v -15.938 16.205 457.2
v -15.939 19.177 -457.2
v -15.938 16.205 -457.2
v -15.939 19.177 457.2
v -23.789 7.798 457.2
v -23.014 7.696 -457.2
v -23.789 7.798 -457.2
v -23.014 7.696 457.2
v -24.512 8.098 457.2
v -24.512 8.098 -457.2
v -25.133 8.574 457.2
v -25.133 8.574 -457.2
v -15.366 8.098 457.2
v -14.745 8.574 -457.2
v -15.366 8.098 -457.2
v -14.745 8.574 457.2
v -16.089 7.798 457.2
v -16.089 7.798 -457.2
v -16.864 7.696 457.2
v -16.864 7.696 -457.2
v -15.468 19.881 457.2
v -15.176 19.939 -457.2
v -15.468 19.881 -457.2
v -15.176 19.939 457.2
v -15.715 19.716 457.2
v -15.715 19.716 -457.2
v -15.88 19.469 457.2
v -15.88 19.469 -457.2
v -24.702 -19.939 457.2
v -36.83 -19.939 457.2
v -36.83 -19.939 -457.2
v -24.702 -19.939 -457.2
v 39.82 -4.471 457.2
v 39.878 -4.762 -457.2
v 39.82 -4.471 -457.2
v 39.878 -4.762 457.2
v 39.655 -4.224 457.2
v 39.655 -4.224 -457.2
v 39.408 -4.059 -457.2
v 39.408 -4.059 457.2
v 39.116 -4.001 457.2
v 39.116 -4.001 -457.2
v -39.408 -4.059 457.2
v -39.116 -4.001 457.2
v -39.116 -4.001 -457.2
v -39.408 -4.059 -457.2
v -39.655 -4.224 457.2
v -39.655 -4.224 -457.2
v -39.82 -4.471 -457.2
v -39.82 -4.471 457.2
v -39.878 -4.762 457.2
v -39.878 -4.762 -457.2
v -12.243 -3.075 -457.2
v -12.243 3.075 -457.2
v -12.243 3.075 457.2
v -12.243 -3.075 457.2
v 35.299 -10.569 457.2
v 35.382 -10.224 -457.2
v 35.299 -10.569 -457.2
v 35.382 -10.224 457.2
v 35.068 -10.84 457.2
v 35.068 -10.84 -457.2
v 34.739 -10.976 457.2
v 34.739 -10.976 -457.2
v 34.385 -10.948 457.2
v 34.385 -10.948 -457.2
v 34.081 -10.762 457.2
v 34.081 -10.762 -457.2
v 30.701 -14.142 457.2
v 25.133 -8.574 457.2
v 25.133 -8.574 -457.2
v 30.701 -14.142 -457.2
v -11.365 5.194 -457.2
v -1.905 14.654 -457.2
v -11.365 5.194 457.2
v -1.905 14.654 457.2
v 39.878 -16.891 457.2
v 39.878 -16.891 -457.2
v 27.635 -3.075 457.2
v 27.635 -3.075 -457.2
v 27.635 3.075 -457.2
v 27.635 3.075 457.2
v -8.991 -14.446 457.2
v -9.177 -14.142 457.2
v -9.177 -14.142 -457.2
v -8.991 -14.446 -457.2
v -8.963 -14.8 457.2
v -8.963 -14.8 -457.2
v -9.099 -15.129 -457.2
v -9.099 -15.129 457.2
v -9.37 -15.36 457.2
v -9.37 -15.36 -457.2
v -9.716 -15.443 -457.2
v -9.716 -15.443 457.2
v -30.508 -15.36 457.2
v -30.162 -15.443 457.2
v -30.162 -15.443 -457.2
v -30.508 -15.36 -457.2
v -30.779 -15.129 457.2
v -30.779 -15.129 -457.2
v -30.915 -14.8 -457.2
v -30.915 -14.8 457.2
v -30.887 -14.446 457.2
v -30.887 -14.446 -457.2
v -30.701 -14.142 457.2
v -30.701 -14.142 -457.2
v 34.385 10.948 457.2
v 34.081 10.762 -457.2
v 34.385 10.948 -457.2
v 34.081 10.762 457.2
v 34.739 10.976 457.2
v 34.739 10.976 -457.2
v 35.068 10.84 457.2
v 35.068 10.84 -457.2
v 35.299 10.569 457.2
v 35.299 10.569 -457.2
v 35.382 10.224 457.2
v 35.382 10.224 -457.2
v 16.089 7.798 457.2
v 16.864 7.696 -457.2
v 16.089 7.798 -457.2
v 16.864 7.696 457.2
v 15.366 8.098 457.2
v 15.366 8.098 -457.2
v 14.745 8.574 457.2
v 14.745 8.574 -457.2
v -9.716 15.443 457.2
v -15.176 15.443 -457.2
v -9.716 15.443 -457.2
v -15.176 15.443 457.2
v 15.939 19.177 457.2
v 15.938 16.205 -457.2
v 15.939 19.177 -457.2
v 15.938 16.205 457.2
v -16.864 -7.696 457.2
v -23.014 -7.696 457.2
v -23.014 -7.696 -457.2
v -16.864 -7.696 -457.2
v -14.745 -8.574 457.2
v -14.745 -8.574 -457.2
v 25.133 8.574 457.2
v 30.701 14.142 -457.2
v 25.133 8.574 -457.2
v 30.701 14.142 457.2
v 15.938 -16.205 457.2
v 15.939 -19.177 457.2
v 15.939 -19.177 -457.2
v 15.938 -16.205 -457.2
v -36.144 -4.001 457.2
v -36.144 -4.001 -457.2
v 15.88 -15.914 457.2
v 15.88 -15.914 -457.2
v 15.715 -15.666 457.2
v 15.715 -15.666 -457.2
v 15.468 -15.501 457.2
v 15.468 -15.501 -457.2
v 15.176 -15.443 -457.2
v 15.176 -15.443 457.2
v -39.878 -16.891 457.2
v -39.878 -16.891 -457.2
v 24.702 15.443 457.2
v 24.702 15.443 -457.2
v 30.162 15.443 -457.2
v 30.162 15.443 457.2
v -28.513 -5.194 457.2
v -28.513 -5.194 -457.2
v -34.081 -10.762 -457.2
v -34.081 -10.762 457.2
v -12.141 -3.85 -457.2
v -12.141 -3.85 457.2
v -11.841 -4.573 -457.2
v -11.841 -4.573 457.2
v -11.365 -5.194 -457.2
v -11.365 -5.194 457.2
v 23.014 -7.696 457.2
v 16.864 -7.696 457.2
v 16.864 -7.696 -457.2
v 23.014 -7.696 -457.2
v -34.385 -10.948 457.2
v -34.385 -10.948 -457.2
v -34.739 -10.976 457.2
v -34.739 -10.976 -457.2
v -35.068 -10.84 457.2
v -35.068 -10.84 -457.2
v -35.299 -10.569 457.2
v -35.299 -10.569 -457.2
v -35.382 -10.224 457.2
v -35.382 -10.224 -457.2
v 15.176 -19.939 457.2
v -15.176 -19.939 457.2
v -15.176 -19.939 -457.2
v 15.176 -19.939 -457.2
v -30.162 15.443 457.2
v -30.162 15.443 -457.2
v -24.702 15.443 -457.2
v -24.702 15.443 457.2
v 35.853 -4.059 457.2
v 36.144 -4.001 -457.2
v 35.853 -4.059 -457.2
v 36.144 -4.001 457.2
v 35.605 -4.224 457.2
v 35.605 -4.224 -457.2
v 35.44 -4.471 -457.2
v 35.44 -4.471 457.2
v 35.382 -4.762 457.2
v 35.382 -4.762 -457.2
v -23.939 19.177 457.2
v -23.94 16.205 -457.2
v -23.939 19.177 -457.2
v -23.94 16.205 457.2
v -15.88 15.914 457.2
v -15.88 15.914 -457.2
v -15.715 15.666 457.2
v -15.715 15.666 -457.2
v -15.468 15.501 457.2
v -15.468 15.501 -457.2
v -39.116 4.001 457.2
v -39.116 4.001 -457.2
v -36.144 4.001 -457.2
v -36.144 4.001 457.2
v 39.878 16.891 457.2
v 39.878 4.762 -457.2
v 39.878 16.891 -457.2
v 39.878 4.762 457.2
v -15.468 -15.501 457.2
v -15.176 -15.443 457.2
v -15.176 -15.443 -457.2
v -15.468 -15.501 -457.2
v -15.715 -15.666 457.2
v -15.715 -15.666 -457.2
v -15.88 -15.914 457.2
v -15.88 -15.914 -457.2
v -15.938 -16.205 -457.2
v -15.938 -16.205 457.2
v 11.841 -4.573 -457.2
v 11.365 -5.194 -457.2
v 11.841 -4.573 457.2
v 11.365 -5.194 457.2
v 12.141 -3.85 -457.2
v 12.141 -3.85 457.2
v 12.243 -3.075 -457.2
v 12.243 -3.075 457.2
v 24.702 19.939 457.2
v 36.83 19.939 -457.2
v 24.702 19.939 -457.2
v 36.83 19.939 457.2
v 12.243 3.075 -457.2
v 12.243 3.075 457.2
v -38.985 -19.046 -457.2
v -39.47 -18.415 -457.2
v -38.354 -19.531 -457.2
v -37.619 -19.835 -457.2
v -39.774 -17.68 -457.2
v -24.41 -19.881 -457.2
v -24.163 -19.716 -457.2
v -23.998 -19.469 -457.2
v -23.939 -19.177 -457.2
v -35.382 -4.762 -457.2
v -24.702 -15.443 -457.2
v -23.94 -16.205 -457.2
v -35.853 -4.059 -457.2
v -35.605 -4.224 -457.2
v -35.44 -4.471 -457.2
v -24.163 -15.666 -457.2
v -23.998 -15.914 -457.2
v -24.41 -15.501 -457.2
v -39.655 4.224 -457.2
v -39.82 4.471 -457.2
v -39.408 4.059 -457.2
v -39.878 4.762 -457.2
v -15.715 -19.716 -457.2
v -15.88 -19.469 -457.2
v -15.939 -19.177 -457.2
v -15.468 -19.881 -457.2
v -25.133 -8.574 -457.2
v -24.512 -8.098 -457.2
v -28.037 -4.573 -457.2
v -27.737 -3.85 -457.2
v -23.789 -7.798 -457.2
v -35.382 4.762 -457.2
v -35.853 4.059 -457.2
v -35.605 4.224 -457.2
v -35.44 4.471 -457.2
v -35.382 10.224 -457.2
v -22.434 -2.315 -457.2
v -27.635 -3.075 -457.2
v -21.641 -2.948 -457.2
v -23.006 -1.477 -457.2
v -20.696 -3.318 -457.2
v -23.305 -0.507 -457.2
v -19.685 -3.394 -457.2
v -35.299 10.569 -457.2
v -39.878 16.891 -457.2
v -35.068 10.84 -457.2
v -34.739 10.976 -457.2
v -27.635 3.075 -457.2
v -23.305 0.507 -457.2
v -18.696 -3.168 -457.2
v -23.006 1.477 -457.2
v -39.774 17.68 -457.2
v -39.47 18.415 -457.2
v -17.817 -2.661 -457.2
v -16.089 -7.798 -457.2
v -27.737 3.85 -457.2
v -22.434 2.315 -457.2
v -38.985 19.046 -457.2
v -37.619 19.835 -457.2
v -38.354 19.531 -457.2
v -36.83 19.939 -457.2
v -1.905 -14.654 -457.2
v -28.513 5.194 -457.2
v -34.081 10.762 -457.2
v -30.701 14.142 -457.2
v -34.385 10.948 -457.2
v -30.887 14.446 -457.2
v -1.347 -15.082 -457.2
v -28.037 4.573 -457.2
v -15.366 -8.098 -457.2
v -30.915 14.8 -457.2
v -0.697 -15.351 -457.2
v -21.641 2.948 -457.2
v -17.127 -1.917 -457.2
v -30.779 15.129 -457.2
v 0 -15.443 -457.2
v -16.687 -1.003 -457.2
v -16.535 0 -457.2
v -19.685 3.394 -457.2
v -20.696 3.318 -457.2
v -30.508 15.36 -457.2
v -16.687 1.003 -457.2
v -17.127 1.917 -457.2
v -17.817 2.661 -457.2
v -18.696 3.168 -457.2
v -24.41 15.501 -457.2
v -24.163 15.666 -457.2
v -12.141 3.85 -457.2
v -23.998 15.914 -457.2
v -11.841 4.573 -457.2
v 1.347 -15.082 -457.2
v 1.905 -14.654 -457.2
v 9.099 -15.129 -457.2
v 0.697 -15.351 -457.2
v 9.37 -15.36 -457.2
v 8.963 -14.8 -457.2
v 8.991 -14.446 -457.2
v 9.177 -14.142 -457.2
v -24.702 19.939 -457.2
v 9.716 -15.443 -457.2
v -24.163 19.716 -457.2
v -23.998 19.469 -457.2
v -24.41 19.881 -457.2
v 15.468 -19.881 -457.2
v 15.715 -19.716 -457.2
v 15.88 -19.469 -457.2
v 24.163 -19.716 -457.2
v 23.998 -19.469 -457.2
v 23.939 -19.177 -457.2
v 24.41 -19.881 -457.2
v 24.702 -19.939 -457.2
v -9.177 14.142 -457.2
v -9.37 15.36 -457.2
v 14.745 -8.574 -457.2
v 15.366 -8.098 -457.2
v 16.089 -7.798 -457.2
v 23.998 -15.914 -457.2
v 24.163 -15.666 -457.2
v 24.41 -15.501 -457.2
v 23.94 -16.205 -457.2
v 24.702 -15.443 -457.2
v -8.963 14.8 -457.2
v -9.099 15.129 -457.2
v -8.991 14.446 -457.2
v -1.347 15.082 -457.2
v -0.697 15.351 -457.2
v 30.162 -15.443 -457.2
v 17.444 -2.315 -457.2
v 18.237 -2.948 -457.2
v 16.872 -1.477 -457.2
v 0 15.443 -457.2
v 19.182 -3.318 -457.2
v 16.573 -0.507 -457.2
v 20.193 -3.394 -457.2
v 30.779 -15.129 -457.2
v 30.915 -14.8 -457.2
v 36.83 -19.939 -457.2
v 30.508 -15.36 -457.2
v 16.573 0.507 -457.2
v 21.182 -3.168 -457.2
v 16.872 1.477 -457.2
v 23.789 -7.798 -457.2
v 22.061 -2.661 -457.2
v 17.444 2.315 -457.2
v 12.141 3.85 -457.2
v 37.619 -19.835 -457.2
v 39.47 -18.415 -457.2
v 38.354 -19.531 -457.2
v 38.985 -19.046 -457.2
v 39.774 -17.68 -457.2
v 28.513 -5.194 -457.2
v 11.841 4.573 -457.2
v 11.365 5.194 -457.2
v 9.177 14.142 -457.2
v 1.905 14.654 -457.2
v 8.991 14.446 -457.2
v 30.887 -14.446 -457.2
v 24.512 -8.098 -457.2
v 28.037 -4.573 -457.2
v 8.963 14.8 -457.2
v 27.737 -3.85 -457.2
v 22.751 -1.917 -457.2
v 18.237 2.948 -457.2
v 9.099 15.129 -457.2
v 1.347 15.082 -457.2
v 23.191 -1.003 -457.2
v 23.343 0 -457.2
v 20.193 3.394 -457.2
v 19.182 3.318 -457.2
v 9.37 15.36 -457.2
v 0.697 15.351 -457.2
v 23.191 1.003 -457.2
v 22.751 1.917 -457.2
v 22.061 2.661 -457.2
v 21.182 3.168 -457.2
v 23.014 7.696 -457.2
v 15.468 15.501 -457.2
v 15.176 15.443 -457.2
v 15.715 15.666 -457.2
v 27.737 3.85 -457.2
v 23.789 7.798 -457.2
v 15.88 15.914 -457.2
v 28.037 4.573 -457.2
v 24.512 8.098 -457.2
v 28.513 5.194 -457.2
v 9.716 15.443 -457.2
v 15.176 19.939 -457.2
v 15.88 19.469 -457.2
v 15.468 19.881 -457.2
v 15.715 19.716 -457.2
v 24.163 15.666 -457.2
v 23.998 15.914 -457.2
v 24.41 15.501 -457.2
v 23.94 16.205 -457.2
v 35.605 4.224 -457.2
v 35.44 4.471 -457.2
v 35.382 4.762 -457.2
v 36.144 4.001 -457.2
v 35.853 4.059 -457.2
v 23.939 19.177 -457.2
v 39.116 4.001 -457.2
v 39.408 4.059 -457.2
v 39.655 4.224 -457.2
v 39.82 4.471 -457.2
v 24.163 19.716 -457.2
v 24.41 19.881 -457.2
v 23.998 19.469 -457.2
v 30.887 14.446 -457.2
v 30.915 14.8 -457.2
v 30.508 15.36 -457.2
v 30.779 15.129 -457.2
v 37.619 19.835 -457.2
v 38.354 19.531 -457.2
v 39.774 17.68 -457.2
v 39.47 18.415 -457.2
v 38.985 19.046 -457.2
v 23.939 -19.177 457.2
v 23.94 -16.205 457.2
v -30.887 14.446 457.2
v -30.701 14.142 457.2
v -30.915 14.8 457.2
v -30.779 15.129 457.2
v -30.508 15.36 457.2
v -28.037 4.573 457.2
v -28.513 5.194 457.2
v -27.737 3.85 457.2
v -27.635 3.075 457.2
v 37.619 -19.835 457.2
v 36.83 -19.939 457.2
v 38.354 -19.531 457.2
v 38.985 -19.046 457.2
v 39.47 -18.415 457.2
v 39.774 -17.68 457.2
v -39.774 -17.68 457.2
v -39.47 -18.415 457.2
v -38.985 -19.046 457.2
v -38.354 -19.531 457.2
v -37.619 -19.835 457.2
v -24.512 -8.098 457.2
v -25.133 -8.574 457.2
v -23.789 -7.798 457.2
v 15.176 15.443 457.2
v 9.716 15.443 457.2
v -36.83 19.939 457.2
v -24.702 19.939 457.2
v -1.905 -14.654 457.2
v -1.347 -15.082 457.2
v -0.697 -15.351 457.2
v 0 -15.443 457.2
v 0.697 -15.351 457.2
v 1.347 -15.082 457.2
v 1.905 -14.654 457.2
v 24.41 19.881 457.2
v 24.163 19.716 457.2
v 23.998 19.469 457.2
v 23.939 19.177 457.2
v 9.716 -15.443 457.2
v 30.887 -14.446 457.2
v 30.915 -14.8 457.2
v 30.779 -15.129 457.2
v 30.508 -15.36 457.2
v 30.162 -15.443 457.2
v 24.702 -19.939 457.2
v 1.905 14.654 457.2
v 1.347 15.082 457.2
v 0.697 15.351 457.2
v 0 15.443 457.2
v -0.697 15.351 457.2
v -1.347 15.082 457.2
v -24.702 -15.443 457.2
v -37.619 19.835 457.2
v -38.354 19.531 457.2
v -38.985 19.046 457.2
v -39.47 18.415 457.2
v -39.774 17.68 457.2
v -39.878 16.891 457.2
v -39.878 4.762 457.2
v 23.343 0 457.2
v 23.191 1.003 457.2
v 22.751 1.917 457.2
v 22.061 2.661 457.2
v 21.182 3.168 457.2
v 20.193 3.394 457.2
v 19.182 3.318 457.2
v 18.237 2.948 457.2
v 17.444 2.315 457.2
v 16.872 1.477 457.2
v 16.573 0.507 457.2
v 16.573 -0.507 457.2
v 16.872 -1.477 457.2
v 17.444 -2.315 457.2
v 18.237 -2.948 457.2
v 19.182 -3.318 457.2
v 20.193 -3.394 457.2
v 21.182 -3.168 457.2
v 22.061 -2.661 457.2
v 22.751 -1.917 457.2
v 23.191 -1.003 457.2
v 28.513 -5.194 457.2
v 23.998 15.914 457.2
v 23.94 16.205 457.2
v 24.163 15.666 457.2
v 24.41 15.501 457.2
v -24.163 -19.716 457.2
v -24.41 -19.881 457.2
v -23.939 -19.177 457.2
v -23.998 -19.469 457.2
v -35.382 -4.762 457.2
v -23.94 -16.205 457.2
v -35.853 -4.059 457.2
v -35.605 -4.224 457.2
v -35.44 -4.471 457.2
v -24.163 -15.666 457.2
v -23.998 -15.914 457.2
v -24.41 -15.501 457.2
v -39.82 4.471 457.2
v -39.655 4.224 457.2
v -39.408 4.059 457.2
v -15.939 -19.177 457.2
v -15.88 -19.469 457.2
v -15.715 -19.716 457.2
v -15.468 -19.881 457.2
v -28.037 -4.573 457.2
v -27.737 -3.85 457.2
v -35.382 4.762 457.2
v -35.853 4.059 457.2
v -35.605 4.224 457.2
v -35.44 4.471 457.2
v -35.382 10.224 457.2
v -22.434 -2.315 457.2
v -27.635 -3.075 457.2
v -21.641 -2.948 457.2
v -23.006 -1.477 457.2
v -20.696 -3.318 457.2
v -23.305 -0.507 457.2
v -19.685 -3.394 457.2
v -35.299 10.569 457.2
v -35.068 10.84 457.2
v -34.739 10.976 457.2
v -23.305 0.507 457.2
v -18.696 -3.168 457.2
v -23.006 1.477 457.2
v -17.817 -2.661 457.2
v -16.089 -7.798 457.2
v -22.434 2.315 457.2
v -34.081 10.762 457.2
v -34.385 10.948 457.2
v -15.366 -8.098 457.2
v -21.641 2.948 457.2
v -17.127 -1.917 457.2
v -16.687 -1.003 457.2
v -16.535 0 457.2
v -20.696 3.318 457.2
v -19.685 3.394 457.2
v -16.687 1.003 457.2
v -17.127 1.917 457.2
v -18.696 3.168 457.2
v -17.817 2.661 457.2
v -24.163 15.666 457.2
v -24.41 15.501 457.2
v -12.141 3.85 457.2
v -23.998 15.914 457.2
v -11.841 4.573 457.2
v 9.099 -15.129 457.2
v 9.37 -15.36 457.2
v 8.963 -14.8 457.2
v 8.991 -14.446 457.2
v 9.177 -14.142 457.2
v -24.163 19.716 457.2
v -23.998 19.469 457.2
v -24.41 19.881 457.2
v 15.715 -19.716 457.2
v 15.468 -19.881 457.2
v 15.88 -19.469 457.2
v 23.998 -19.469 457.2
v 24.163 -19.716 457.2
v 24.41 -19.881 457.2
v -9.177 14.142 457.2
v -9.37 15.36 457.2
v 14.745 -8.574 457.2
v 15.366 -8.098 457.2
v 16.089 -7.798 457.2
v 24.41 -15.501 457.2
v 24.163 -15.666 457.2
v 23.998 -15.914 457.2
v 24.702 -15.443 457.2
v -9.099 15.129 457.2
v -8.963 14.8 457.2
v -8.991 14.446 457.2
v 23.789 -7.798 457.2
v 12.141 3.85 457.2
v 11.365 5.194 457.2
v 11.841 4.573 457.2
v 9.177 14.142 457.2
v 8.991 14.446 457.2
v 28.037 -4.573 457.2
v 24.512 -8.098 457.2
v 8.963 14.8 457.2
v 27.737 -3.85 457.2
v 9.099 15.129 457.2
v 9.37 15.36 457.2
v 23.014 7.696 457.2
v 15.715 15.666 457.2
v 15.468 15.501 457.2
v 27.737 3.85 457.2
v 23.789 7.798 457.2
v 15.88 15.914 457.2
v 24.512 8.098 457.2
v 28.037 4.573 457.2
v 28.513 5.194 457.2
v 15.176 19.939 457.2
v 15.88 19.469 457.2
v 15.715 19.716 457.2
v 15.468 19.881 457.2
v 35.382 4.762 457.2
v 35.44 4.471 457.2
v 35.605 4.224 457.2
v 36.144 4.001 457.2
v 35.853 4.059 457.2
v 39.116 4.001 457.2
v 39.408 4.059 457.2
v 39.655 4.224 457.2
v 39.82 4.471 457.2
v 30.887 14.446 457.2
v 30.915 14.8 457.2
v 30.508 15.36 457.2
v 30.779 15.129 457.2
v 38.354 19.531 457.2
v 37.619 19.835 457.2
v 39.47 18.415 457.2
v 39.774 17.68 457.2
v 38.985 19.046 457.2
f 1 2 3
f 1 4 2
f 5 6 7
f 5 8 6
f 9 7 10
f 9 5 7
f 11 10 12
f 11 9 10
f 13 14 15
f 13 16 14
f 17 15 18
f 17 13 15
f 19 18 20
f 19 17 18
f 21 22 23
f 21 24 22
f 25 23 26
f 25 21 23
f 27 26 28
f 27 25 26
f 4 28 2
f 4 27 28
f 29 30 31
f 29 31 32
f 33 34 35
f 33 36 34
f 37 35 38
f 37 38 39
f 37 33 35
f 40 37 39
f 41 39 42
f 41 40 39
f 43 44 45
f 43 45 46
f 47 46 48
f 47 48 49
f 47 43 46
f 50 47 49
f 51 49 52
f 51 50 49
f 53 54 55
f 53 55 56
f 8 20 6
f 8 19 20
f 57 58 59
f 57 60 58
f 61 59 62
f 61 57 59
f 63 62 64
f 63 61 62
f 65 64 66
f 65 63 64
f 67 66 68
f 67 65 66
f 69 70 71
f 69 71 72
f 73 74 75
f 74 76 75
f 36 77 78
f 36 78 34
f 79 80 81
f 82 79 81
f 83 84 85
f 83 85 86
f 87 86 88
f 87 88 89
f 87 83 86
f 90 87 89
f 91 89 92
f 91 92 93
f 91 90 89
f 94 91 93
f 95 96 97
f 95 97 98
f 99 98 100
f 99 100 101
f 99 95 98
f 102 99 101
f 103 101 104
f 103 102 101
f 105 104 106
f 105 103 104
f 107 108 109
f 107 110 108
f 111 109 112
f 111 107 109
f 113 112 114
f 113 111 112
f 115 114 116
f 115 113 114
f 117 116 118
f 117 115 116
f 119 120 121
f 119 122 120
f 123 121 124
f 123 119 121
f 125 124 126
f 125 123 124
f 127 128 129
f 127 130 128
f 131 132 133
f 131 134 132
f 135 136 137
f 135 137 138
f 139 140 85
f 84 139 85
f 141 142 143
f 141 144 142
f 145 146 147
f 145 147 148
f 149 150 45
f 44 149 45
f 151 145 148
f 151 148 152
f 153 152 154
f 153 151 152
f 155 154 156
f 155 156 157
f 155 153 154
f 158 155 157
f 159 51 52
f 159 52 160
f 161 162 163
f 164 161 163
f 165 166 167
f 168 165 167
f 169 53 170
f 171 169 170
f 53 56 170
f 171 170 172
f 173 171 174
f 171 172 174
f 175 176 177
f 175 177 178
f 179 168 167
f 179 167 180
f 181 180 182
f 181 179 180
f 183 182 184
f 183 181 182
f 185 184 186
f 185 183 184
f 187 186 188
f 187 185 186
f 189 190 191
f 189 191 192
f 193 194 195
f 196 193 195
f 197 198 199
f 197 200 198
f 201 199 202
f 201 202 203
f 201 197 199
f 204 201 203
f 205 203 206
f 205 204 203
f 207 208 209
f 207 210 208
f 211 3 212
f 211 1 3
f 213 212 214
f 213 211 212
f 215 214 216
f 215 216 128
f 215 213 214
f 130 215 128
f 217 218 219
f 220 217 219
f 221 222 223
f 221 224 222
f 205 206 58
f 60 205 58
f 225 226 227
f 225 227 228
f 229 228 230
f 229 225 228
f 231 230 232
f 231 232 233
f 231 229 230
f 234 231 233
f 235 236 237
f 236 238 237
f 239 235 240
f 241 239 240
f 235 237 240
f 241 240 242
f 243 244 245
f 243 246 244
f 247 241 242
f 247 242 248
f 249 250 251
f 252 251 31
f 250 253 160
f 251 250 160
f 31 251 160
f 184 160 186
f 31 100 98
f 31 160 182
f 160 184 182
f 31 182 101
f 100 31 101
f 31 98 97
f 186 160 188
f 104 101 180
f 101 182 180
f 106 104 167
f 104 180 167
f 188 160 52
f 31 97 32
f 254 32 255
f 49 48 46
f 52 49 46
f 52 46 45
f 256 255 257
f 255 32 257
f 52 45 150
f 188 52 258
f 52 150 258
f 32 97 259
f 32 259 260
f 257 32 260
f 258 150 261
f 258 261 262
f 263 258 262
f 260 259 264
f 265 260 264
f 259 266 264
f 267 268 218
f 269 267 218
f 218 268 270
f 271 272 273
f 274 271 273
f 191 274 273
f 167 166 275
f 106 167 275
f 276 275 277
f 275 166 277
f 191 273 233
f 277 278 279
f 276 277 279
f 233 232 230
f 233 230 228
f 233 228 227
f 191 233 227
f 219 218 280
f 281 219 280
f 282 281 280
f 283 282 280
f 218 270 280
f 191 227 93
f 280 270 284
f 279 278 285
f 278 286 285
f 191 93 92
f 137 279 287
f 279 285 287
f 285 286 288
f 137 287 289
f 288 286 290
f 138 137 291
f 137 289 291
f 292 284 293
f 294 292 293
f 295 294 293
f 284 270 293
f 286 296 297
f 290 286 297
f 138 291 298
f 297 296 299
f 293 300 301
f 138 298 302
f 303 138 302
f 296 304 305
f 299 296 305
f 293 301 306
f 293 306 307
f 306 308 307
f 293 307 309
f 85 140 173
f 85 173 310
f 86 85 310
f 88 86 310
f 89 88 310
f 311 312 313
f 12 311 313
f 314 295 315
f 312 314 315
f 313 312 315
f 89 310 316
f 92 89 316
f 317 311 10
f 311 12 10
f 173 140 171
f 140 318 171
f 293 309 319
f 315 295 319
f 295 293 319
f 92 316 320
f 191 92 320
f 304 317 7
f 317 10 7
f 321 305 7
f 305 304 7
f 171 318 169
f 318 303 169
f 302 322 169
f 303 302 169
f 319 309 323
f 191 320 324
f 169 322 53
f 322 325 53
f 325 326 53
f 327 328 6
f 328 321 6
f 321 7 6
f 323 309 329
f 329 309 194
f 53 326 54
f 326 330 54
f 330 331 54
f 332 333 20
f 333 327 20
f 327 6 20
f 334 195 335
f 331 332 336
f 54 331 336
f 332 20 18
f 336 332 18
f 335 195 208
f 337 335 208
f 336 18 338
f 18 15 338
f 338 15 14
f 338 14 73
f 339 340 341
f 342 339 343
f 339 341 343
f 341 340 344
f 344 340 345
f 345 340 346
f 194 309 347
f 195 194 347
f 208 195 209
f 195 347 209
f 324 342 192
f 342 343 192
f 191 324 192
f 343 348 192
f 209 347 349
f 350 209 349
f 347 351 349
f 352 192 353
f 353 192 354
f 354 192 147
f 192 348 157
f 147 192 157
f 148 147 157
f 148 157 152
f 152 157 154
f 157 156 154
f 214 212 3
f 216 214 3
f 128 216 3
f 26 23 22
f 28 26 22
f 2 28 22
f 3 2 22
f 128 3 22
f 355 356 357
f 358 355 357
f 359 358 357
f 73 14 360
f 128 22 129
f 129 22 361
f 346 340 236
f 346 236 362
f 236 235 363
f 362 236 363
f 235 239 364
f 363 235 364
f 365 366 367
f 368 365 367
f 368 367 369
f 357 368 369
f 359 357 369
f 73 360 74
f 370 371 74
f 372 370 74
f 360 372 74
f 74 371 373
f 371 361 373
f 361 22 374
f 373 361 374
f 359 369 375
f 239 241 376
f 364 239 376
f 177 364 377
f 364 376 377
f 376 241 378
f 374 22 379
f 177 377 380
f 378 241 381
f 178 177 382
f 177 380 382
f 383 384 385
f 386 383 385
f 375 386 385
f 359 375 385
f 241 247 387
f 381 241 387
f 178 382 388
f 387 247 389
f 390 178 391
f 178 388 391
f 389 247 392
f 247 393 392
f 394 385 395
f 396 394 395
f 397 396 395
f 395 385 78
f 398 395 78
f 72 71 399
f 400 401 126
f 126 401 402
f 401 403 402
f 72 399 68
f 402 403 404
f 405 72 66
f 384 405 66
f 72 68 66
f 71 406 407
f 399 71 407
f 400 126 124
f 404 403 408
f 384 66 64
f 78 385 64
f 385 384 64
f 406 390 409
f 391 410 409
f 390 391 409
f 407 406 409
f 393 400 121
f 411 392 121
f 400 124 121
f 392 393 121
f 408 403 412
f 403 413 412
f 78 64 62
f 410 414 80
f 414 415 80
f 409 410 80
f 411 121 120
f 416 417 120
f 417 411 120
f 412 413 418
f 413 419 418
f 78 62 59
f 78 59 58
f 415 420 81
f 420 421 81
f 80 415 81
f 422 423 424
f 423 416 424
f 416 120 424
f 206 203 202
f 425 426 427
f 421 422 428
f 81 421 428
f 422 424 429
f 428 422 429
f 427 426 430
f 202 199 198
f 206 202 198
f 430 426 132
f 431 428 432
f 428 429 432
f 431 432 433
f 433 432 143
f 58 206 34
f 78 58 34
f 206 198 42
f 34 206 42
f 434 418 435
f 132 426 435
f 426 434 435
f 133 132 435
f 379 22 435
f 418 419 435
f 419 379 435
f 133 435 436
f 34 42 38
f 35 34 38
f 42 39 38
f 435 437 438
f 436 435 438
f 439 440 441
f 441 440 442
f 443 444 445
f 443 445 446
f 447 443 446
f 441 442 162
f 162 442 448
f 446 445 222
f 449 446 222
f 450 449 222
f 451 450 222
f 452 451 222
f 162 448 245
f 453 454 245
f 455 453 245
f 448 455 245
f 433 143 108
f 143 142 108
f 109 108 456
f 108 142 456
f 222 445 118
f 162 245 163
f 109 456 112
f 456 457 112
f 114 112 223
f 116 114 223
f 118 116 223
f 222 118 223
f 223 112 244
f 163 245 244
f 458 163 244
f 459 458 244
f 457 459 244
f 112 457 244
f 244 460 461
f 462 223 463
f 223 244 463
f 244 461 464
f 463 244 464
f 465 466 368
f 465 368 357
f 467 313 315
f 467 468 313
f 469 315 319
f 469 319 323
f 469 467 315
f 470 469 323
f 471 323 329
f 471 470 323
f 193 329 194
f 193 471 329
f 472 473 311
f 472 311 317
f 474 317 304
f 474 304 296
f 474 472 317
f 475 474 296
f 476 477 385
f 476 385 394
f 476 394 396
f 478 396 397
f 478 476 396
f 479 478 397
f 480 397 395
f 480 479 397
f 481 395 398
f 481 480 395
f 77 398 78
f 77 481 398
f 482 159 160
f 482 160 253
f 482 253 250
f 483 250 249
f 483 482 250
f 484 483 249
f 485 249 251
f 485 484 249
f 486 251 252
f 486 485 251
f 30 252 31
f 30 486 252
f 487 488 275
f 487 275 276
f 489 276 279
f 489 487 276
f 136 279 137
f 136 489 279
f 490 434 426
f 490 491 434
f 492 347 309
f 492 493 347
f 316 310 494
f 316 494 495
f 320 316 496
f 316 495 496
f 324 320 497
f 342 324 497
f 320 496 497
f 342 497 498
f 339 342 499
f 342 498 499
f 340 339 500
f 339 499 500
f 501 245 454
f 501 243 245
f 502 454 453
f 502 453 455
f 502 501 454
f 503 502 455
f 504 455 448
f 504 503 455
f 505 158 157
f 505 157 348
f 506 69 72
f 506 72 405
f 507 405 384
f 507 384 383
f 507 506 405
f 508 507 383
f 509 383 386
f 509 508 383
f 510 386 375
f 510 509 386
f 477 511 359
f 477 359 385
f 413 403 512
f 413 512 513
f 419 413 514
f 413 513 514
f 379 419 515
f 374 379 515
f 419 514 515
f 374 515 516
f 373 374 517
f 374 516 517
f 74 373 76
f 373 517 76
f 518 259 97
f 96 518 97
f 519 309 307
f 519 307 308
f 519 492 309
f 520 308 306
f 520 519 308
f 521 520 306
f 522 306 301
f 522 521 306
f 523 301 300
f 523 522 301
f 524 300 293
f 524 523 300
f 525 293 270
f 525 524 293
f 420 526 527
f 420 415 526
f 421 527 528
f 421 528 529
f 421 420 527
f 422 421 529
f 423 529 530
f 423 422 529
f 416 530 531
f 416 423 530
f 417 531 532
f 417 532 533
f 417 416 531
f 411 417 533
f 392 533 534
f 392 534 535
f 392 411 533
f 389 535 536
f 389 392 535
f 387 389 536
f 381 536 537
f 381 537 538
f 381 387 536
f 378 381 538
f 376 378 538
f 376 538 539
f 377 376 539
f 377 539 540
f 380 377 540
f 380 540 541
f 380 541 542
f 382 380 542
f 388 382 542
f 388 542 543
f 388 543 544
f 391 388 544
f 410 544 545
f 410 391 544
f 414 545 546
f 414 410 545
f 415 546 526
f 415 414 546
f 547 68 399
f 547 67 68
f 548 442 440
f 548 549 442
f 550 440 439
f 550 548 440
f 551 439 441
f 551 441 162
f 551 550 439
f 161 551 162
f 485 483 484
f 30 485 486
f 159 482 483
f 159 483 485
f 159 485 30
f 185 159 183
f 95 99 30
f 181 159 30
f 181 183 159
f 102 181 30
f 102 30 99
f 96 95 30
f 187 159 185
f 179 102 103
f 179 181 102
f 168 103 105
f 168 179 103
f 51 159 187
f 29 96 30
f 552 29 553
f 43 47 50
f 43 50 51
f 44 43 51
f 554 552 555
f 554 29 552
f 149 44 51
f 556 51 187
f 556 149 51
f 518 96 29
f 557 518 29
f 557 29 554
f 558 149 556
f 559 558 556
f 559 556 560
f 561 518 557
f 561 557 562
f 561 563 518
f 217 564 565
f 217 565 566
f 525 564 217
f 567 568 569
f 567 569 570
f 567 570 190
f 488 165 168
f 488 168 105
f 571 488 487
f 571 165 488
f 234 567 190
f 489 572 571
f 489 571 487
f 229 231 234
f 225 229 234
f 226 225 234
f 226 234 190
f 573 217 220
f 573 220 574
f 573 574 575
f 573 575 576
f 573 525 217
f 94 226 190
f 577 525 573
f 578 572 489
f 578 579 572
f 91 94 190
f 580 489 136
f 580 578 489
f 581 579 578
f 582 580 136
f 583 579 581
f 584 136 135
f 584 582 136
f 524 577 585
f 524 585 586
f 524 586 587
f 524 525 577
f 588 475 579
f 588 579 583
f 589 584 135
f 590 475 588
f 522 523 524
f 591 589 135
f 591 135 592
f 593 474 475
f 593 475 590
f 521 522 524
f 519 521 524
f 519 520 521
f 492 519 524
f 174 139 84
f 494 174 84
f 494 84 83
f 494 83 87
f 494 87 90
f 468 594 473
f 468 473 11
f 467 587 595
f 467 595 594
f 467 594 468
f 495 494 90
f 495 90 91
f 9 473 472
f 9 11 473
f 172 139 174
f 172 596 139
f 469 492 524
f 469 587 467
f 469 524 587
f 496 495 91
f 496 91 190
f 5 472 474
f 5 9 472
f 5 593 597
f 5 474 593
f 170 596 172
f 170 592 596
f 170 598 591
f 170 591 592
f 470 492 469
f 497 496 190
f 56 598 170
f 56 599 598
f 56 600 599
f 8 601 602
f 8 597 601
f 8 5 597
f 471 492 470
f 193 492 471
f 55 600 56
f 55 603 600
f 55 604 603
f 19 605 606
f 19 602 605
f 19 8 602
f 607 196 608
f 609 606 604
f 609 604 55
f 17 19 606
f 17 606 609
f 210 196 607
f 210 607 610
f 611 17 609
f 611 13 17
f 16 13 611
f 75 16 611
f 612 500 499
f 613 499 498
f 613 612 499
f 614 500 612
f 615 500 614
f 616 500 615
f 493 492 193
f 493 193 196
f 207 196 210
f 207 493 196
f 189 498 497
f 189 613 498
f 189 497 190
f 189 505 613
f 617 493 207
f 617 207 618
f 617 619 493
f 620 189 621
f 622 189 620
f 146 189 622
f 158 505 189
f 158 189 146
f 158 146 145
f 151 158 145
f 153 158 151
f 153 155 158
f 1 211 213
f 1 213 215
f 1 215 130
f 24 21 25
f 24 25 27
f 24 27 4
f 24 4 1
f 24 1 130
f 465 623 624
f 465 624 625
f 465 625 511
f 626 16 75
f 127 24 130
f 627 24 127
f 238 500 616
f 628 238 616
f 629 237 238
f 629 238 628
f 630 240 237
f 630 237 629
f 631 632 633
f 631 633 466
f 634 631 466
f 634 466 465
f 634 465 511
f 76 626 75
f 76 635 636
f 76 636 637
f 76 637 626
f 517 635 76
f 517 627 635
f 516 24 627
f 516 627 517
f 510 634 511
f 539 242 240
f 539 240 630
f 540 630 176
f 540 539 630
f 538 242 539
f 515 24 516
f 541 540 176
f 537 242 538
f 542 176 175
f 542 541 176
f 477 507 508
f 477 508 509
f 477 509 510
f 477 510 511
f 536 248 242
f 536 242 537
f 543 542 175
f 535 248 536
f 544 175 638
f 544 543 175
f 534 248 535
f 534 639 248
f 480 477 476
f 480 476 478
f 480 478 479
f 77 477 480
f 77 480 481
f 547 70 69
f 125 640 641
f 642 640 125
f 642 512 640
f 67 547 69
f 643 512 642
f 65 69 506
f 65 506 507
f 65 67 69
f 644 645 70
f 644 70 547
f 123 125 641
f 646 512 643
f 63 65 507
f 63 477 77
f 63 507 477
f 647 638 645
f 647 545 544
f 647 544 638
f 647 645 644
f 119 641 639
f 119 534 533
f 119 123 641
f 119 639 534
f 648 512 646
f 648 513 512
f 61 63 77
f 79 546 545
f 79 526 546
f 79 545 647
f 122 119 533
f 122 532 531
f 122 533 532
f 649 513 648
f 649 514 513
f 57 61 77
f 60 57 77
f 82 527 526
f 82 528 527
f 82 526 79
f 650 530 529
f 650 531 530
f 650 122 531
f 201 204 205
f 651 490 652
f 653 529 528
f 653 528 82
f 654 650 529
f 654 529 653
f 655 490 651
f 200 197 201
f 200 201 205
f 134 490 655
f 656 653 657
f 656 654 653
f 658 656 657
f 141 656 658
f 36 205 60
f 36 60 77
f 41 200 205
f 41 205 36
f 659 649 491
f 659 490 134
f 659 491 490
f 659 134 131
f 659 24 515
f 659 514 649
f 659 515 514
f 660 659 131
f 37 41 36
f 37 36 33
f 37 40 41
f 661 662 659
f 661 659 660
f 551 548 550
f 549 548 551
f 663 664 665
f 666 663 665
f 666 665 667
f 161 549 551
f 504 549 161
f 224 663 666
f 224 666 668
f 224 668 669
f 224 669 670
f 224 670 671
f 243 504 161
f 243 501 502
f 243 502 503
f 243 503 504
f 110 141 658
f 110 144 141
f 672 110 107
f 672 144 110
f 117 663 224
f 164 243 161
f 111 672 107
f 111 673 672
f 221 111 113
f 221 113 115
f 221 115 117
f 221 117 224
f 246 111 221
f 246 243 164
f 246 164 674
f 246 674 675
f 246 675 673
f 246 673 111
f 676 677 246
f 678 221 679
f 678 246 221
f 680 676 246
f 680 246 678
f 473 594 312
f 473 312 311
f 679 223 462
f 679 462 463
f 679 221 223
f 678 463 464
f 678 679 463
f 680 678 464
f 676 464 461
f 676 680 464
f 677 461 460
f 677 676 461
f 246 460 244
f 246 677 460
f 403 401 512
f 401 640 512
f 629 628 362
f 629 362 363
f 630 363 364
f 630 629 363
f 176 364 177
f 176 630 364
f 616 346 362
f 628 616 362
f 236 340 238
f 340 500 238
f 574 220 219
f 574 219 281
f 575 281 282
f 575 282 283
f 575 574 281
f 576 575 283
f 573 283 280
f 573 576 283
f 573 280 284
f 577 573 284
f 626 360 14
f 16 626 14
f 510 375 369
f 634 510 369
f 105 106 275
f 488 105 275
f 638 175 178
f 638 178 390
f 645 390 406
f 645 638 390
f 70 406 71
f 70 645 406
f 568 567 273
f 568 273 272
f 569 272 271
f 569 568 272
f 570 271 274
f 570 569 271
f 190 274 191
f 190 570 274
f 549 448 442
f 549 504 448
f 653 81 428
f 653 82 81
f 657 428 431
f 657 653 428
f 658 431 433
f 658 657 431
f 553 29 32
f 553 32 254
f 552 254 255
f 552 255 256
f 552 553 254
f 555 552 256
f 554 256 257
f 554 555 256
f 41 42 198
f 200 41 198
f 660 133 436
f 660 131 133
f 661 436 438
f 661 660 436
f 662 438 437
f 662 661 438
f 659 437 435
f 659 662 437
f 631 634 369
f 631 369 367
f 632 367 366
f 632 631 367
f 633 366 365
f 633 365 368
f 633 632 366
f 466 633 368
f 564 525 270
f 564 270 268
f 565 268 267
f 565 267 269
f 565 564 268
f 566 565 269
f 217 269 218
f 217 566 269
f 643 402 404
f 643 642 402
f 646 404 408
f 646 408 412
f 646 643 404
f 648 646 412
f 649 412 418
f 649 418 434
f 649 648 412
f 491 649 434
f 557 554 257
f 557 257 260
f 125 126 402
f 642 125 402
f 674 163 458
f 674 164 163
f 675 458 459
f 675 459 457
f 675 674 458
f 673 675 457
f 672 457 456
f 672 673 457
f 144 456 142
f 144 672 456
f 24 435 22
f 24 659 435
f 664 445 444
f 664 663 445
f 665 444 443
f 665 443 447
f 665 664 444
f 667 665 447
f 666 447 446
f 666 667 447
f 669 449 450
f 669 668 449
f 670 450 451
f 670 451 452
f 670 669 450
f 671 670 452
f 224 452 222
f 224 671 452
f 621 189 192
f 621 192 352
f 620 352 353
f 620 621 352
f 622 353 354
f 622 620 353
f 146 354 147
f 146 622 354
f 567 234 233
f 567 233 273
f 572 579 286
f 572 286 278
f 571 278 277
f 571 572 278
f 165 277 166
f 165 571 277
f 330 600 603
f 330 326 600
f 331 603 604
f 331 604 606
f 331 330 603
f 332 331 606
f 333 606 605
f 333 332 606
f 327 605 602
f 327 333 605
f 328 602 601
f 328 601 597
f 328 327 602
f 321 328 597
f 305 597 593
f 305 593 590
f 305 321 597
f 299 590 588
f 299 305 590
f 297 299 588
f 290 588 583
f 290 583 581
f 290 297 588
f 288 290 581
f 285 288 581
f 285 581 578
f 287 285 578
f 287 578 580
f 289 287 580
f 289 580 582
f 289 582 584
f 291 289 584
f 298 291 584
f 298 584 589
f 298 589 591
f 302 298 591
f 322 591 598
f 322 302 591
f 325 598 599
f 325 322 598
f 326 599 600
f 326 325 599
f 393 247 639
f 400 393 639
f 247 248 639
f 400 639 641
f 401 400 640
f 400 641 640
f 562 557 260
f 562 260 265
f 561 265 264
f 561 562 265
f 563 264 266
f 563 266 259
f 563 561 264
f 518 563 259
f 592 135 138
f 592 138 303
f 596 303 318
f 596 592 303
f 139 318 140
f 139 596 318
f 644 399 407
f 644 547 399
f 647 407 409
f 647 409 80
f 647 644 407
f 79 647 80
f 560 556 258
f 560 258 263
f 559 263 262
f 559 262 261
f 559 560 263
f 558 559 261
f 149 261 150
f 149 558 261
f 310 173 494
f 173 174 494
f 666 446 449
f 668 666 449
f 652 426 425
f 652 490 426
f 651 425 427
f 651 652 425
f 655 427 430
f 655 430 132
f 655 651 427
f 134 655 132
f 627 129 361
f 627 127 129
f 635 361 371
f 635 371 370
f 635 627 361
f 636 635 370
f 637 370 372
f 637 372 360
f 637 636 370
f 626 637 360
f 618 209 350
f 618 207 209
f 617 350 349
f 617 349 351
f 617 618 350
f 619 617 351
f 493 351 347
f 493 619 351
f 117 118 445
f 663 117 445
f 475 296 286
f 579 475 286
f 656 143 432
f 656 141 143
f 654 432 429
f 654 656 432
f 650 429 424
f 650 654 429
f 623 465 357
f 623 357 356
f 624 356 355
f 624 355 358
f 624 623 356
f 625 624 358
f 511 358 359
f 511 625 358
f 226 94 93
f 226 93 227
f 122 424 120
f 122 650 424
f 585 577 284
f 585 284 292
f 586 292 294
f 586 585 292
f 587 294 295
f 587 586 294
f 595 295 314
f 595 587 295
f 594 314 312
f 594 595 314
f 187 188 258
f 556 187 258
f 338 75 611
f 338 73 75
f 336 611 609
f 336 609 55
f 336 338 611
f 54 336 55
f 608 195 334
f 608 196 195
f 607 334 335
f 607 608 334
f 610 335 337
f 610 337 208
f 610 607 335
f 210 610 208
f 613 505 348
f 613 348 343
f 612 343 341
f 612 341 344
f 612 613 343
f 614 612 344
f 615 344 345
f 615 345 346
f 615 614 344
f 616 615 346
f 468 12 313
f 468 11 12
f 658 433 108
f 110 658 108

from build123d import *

# Parameters (mm, degrees)
SKETCH1_R           = 3.4036
BOSS_EXTRUDE1_DEPTH = 457.2


with BuildPart() as part:
    # Sketch1 → Boss-Extrude1 (new body, symmetric)
    with BuildSketch(Plane.XY):
        with BuildLine():
            Line((-39.878, 16.891), (-39.878, 4.7625))
            ThreePointArc((-39.878, 4.7625), (-39.654815367, 4.223684633), (-39.116, 4.0005))
            Line((-39.116, 4.0005), (-36.1442, 4.0005))
            ThreePointArc((-36.1442, 4.0005), (-35.605384633, 4.223684633), (-35.3822, 4.7625))
            Line((-35.3822, 4.7625), (-35.3822, 10.2235))
            ThreePointArc((-35.3822, 10.2235), (-34.911804775, 10.927496204), (-34.081384633, 10.762315367))
            Line((-34.081384633, 10.762315367), (-28.513059555, 5.19399029))
            ThreePointArc((-28.513059555, 5.19399029), (-27.863348265, 4.221628629), (-27.6352, 3.074649845))
            Line((-27.6352, 3.074649845), (-27.6352, -3.074649845))
            ThreePointArc((-27.6352, -3.074649845), (-27.863348265, -4.221628629), (-28.513059555, -5.19399029))
            Line((-28.513059555, -5.19399029), (-34.081384633, -10.762315367))
            ThreePointArc((-34.081384633, -10.762315367), (-34.911804775, -10.927496204), (-35.3822, -10.2235))
            Line((-35.3822, -10.2235), (-35.3822, -4.7625))
            ThreePointArc((-35.3822, -4.7625), (-35.605384633, -4.223684633), (-36.1442, -4.0005))
            Line((-36.1442, -4.0005), (-39.116, -4.0005))
            ThreePointArc((-39.116, -4.0005), (-39.654815367, -4.223684633), (-39.878, -4.7625))
            Line((-39.878, -4.7625), (-39.878, -16.891))
            ThreePointArc((-39.878, -16.891), (-38.985261469, -19.046261469), (-36.83, -19.939))
            Line((-36.83, -19.939), (-24.7015, -19.939))
            ThreePointArc((-24.7015, -19.939), (-24.162684633, -19.715815367), (-23.9395, -19.177))
            Line((-23.9395, -19.177), (-23.9395, -16.2052))
            ThreePointArc((-23.9395, -16.2052), (-24.162684633, -15.666384633), (-24.7015, -15.4432))
            Line((-24.7015, -15.4432), (-30.1625, -15.4432))
            ThreePointArc((-30.1625, -15.4432), (-30.866496204, -14.972804775), (-30.701315367, -14.142384633))
            Line((-30.701315367, -14.142384633), (-25.13299029, -8.574059555))
            ThreePointArc((-25.13299029, -8.574059555), (-24.160628629, -7.924348265), (-23.013649845, -7.6962))
            Line((-23.013649845, -7.6962), (-16.864350155, -7.6962))
            ThreePointArc((-16.864350155, -7.6962), (-15.717371371, -7.924348265), (-14.74500971, -8.574059555))
            Line((-14.74500971, -8.574059555), (-9.176684633, -14.142384633))
            ThreePointArc((-9.176684633, -14.142384633), (-9.011503796, -14.972804775), (-9.7155, -15.4432))
            Line((-9.7155, -15.4432), (-15.1765, -15.4432))
            ThreePointArc((-15.1765, -15.4432), (-15.715315367, -15.666384633), (-15.9385, -16.2052))
            Line((-15.9385, -16.2052), (-15.9385, -19.177))
            ThreePointArc((-15.9385, -19.177), (-15.715315367, -19.715815367), (-15.1765, -19.939))
            Line((-15.1765, -19.939), (15.1765, -19.939))
            ThreePointArc((15.1765, -19.939), (15.715315367, -19.715815367), (15.9385, -19.177))
            Line((15.9385, -19.177), (15.9385, -16.2052))
            ThreePointArc((15.9385, -16.2052), (15.715315367, -15.666384633), (15.1765, -15.4432))
            Line((15.1765, -15.4432), (9.7155, -15.4432))
            ThreePointArc((9.7155, -15.4432), (9.011503796, -14.972804775), (9.176684633, -14.142384633))
            Line((9.176684633, -14.142384633), (14.74500971, -8.574059555))
            ThreePointArc((14.74500971, -8.574059555), (15.717371371, -7.924348265), (16.864350155, -7.6962))
            Line((16.864350155, -7.6962), (23.013649845, -7.6962))
            ThreePointArc((23.013649845, -7.6962), (24.160628629, -7.924348265), (25.13299029, -8.574059555))
            Line((25.13299029, -8.574059555), (30.701315367, -14.142384633))
            ThreePointArc((30.701315367, -14.142384633), (30.866496204, -14.972804775), (30.1625, -15.4432))
            Line((30.1625, -15.4432), (24.7015, -15.4432))
            ThreePointArc((24.7015, -15.4432), (24.162684633, -15.666384633), (23.9395, -16.2052))
            Line((23.9395, -16.2052), (23.9395, -19.177))
            ThreePointArc((23.9395, -19.177), (24.162684633, -19.715815367), (24.7015, -19.939))
            Line((24.7015, -19.939), (36.83, -19.939))
            ThreePointArc((36.83, -19.939), (38.985261469, -19.046261469), (39.878, -16.891))
            Line((39.878, -16.891), (39.878, -4.7625))
            ThreePointArc((39.878, -4.7625), (39.654815367, -4.223684633), (39.116, -4.0005))
            Line((39.116, -4.0005), (36.1442, -4.0005))
            ThreePointArc((36.1442, -4.0005), (35.605384633, -4.223684633), (35.3822, -4.7625))
            Line((35.3822, -4.7625), (35.3822, -10.2235))
            ThreePointArc((35.3822, -10.2235), (34.911804775, -10.927496204), (34.081384633, -10.762315367))
            Line((34.081384633, -10.762315367), (28.513059555, -5.19399029))
            ThreePointArc((28.513059555, -5.19399029), (27.863348265, -4.221628629), (27.6352, -3.074649845))
            Line((27.6352, -3.074649845), (27.6352, 3.074649845))
            ThreePointArc((27.6352, 3.074649845), (27.863348265, 4.221628629), (28.513059555, 5.19399029))
            Line((28.513059555, 5.19399029), (34.081384633, 10.762315367))
            ThreePointArc((34.081384633, 10.762315367), (34.911804775, 10.927496204), (35.3822, 10.2235))
            Line((35.3822, 10.2235), (35.3822, 4.7625))
            ThreePointArc((35.3822, 4.7625), (35.605384633, 4.223684633), (36.1442, 4.0005))
            Line((36.1442, 4.0005), (39.116, 4.0005))
            ThreePointArc((39.116, 4.0005), (39.654815367, 4.223684633), (39.878, 4.7625))
            Line((39.878, 4.7625), (39.878, 16.891))
            ThreePointArc((39.878, 16.891), (38.985261469, 19.046261469), (36.83, 19.939))
            Line((36.83, 19.939), (24.7015, 19.939))
            ThreePointArc((24.7015, 19.939), (24.162684633, 19.715815367), (23.9395, 19.177))
            Line((23.9395, 19.177), (23.9395, 16.2052))
            ThreePointArc((23.9395, 16.2052), (24.162684633, 15.666384633), (24.7015, 15.4432))
            Line((24.7015, 15.4432), (30.1625, 15.4432))
            ThreePointArc((30.1625, 15.4432), (30.866496204, 14.972804775), (30.701315367, 14.142384633))
            Line((30.701315367, 14.142384633), (25.13299029, 8.574059555))
            ThreePointArc((25.13299029, 8.574059555), (24.160628629, 7.924348265), (23.013649845, 7.6962))
            Line((23.013649845, 7.6962), (16.864350155, 7.6962))
            ThreePointArc((16.864350155, 7.6962), (15.717371371, 7.924348265), (14.74500971, 8.574059555))
            Line((14.74500971, 8.574059555), (9.176684633, 14.142384633))
            ThreePointArc((9.176684633, 14.142384633), (9.011503796, 14.972804775), (9.7155, 15.4432))
            Line((9.7155, 15.4432), (15.1765, 15.4432))
            ThreePointArc((15.1765, 15.4432), (15.715315367, 15.666384633), (15.9385, 16.2052))
            Line((15.9385, 16.2052), (15.9385, 19.177))
            ThreePointArc((15.9385, 19.177), (15.715315367, 19.715815367), (15.1765, 19.939))
            Line((15.1765, 19.939), (-15.1765, 19.939))
            ThreePointArc((-15.1765, 19.939), (-15.715315367, 19.715815367), (-15.9385, 19.177))
            Line((-15.9385, 19.177), (-15.9385, 16.2052))
            ThreePointArc((-15.9385, 16.2052), (-15.715315367, 15.666384633), (-15.1765, 15.4432))
            Line((-15.1765, 15.4432), (-9.7155, 15.4432))
            ThreePointArc((-9.7155, 15.4432), (-9.011503796, 14.972804775), (-9.176684633, 14.142384633))
            Line((-9.176684633, 14.142384633), (-14.74500971, 8.574059555))
            ThreePointArc((-14.74500971, 8.574059555), (-15.717371371, 7.924348265), (-16.864350155, 7.6962))
            Line((-16.864350155, 7.6962), (-23.013649845, 7.6962))
            ThreePointArc((-23.013649845, 7.6962), (-24.160628629, 7.924348265), (-25.13299029, 8.574059555))
            Line((-25.13299029, 8.574059555), (-30.701315367, 14.142384633))
            ThreePointArc((-30.701315367, 14.142384633), (-30.866496204, 14.972804775), (-30.1625, 15.4432))
            Line((-30.1625, 15.4432), (-24.7015, 15.4432))
            ThreePointArc((-24.7015, 15.4432), (-24.162684633, 15.666384633), (-23.9395, 16.2052))
            Line((-23.9395, 16.2052), (-23.9395, 19.177))
            ThreePointArc((-23.9395, 19.177), (-24.162684633, 19.715815367), (-24.7015, 19.939))
            Line((-24.7015, 19.939), (-36.83, 19.939))
            ThreePointArc((-36.83, 19.939), (-38.985261469, 19.046261469), (-39.878, 16.891))
        make_face()
        with Locations((-19.939, 0)):
            Circle(SKETCH1_R, mode=Mode.SUBTRACT)
        with Locations((19.939, 0)):
            Circle(SKETCH1_R, mode=Mode.SUBTRACT)
        with BuildLine():
            Line((-12.2428, 3.074649845), (-12.2428, -3.074649845))
            ThreePointArc((-12.2428, -3.074649845), (-12.014651735, -4.221628629), (-11.364940445, -5.19399029))
            Line((-11.364940445, -5.19399029), (-1.904671503, -14.654259232))
            ThreePointArc((-1.904671503, -14.654259232), (0, -15.4432), (1.904671503, -14.654259232))
            Line((1.904671503, -14.654259232), (11.364940445, -5.19399029))
            ThreePointArc((11.364940445, -5.19399029), (12.014651735, -4.221628629), (12.2428, -3.074649845))
            Line((12.2428, -3.074649845), (12.2428, 3.074649845))
            ThreePointArc((12.2428, 3.074649845), (12.014651735, 4.221628629), (11.364940445, 5.19399029))
            Line((11.364940445, 5.19399029), (1.904671503, 14.654259232))
            ThreePointArc((1.904671503, 14.654259232), (0, 15.4432), (-1.904671503, 14.654259232))
            Line((-1.904671503, 14.654259232), (-11.364940445, 5.19399029))
            ThreePointArc((-11.364940445, 5.19399029), (-12.014651735, 4.221628629), (-12.2428, 3.074649845))
        make_face(mode=Mode.SUBTRACT)
    extrude(amount=BOSS_EXTRUDE1_DEPTH, both=True)


solid = part.part
